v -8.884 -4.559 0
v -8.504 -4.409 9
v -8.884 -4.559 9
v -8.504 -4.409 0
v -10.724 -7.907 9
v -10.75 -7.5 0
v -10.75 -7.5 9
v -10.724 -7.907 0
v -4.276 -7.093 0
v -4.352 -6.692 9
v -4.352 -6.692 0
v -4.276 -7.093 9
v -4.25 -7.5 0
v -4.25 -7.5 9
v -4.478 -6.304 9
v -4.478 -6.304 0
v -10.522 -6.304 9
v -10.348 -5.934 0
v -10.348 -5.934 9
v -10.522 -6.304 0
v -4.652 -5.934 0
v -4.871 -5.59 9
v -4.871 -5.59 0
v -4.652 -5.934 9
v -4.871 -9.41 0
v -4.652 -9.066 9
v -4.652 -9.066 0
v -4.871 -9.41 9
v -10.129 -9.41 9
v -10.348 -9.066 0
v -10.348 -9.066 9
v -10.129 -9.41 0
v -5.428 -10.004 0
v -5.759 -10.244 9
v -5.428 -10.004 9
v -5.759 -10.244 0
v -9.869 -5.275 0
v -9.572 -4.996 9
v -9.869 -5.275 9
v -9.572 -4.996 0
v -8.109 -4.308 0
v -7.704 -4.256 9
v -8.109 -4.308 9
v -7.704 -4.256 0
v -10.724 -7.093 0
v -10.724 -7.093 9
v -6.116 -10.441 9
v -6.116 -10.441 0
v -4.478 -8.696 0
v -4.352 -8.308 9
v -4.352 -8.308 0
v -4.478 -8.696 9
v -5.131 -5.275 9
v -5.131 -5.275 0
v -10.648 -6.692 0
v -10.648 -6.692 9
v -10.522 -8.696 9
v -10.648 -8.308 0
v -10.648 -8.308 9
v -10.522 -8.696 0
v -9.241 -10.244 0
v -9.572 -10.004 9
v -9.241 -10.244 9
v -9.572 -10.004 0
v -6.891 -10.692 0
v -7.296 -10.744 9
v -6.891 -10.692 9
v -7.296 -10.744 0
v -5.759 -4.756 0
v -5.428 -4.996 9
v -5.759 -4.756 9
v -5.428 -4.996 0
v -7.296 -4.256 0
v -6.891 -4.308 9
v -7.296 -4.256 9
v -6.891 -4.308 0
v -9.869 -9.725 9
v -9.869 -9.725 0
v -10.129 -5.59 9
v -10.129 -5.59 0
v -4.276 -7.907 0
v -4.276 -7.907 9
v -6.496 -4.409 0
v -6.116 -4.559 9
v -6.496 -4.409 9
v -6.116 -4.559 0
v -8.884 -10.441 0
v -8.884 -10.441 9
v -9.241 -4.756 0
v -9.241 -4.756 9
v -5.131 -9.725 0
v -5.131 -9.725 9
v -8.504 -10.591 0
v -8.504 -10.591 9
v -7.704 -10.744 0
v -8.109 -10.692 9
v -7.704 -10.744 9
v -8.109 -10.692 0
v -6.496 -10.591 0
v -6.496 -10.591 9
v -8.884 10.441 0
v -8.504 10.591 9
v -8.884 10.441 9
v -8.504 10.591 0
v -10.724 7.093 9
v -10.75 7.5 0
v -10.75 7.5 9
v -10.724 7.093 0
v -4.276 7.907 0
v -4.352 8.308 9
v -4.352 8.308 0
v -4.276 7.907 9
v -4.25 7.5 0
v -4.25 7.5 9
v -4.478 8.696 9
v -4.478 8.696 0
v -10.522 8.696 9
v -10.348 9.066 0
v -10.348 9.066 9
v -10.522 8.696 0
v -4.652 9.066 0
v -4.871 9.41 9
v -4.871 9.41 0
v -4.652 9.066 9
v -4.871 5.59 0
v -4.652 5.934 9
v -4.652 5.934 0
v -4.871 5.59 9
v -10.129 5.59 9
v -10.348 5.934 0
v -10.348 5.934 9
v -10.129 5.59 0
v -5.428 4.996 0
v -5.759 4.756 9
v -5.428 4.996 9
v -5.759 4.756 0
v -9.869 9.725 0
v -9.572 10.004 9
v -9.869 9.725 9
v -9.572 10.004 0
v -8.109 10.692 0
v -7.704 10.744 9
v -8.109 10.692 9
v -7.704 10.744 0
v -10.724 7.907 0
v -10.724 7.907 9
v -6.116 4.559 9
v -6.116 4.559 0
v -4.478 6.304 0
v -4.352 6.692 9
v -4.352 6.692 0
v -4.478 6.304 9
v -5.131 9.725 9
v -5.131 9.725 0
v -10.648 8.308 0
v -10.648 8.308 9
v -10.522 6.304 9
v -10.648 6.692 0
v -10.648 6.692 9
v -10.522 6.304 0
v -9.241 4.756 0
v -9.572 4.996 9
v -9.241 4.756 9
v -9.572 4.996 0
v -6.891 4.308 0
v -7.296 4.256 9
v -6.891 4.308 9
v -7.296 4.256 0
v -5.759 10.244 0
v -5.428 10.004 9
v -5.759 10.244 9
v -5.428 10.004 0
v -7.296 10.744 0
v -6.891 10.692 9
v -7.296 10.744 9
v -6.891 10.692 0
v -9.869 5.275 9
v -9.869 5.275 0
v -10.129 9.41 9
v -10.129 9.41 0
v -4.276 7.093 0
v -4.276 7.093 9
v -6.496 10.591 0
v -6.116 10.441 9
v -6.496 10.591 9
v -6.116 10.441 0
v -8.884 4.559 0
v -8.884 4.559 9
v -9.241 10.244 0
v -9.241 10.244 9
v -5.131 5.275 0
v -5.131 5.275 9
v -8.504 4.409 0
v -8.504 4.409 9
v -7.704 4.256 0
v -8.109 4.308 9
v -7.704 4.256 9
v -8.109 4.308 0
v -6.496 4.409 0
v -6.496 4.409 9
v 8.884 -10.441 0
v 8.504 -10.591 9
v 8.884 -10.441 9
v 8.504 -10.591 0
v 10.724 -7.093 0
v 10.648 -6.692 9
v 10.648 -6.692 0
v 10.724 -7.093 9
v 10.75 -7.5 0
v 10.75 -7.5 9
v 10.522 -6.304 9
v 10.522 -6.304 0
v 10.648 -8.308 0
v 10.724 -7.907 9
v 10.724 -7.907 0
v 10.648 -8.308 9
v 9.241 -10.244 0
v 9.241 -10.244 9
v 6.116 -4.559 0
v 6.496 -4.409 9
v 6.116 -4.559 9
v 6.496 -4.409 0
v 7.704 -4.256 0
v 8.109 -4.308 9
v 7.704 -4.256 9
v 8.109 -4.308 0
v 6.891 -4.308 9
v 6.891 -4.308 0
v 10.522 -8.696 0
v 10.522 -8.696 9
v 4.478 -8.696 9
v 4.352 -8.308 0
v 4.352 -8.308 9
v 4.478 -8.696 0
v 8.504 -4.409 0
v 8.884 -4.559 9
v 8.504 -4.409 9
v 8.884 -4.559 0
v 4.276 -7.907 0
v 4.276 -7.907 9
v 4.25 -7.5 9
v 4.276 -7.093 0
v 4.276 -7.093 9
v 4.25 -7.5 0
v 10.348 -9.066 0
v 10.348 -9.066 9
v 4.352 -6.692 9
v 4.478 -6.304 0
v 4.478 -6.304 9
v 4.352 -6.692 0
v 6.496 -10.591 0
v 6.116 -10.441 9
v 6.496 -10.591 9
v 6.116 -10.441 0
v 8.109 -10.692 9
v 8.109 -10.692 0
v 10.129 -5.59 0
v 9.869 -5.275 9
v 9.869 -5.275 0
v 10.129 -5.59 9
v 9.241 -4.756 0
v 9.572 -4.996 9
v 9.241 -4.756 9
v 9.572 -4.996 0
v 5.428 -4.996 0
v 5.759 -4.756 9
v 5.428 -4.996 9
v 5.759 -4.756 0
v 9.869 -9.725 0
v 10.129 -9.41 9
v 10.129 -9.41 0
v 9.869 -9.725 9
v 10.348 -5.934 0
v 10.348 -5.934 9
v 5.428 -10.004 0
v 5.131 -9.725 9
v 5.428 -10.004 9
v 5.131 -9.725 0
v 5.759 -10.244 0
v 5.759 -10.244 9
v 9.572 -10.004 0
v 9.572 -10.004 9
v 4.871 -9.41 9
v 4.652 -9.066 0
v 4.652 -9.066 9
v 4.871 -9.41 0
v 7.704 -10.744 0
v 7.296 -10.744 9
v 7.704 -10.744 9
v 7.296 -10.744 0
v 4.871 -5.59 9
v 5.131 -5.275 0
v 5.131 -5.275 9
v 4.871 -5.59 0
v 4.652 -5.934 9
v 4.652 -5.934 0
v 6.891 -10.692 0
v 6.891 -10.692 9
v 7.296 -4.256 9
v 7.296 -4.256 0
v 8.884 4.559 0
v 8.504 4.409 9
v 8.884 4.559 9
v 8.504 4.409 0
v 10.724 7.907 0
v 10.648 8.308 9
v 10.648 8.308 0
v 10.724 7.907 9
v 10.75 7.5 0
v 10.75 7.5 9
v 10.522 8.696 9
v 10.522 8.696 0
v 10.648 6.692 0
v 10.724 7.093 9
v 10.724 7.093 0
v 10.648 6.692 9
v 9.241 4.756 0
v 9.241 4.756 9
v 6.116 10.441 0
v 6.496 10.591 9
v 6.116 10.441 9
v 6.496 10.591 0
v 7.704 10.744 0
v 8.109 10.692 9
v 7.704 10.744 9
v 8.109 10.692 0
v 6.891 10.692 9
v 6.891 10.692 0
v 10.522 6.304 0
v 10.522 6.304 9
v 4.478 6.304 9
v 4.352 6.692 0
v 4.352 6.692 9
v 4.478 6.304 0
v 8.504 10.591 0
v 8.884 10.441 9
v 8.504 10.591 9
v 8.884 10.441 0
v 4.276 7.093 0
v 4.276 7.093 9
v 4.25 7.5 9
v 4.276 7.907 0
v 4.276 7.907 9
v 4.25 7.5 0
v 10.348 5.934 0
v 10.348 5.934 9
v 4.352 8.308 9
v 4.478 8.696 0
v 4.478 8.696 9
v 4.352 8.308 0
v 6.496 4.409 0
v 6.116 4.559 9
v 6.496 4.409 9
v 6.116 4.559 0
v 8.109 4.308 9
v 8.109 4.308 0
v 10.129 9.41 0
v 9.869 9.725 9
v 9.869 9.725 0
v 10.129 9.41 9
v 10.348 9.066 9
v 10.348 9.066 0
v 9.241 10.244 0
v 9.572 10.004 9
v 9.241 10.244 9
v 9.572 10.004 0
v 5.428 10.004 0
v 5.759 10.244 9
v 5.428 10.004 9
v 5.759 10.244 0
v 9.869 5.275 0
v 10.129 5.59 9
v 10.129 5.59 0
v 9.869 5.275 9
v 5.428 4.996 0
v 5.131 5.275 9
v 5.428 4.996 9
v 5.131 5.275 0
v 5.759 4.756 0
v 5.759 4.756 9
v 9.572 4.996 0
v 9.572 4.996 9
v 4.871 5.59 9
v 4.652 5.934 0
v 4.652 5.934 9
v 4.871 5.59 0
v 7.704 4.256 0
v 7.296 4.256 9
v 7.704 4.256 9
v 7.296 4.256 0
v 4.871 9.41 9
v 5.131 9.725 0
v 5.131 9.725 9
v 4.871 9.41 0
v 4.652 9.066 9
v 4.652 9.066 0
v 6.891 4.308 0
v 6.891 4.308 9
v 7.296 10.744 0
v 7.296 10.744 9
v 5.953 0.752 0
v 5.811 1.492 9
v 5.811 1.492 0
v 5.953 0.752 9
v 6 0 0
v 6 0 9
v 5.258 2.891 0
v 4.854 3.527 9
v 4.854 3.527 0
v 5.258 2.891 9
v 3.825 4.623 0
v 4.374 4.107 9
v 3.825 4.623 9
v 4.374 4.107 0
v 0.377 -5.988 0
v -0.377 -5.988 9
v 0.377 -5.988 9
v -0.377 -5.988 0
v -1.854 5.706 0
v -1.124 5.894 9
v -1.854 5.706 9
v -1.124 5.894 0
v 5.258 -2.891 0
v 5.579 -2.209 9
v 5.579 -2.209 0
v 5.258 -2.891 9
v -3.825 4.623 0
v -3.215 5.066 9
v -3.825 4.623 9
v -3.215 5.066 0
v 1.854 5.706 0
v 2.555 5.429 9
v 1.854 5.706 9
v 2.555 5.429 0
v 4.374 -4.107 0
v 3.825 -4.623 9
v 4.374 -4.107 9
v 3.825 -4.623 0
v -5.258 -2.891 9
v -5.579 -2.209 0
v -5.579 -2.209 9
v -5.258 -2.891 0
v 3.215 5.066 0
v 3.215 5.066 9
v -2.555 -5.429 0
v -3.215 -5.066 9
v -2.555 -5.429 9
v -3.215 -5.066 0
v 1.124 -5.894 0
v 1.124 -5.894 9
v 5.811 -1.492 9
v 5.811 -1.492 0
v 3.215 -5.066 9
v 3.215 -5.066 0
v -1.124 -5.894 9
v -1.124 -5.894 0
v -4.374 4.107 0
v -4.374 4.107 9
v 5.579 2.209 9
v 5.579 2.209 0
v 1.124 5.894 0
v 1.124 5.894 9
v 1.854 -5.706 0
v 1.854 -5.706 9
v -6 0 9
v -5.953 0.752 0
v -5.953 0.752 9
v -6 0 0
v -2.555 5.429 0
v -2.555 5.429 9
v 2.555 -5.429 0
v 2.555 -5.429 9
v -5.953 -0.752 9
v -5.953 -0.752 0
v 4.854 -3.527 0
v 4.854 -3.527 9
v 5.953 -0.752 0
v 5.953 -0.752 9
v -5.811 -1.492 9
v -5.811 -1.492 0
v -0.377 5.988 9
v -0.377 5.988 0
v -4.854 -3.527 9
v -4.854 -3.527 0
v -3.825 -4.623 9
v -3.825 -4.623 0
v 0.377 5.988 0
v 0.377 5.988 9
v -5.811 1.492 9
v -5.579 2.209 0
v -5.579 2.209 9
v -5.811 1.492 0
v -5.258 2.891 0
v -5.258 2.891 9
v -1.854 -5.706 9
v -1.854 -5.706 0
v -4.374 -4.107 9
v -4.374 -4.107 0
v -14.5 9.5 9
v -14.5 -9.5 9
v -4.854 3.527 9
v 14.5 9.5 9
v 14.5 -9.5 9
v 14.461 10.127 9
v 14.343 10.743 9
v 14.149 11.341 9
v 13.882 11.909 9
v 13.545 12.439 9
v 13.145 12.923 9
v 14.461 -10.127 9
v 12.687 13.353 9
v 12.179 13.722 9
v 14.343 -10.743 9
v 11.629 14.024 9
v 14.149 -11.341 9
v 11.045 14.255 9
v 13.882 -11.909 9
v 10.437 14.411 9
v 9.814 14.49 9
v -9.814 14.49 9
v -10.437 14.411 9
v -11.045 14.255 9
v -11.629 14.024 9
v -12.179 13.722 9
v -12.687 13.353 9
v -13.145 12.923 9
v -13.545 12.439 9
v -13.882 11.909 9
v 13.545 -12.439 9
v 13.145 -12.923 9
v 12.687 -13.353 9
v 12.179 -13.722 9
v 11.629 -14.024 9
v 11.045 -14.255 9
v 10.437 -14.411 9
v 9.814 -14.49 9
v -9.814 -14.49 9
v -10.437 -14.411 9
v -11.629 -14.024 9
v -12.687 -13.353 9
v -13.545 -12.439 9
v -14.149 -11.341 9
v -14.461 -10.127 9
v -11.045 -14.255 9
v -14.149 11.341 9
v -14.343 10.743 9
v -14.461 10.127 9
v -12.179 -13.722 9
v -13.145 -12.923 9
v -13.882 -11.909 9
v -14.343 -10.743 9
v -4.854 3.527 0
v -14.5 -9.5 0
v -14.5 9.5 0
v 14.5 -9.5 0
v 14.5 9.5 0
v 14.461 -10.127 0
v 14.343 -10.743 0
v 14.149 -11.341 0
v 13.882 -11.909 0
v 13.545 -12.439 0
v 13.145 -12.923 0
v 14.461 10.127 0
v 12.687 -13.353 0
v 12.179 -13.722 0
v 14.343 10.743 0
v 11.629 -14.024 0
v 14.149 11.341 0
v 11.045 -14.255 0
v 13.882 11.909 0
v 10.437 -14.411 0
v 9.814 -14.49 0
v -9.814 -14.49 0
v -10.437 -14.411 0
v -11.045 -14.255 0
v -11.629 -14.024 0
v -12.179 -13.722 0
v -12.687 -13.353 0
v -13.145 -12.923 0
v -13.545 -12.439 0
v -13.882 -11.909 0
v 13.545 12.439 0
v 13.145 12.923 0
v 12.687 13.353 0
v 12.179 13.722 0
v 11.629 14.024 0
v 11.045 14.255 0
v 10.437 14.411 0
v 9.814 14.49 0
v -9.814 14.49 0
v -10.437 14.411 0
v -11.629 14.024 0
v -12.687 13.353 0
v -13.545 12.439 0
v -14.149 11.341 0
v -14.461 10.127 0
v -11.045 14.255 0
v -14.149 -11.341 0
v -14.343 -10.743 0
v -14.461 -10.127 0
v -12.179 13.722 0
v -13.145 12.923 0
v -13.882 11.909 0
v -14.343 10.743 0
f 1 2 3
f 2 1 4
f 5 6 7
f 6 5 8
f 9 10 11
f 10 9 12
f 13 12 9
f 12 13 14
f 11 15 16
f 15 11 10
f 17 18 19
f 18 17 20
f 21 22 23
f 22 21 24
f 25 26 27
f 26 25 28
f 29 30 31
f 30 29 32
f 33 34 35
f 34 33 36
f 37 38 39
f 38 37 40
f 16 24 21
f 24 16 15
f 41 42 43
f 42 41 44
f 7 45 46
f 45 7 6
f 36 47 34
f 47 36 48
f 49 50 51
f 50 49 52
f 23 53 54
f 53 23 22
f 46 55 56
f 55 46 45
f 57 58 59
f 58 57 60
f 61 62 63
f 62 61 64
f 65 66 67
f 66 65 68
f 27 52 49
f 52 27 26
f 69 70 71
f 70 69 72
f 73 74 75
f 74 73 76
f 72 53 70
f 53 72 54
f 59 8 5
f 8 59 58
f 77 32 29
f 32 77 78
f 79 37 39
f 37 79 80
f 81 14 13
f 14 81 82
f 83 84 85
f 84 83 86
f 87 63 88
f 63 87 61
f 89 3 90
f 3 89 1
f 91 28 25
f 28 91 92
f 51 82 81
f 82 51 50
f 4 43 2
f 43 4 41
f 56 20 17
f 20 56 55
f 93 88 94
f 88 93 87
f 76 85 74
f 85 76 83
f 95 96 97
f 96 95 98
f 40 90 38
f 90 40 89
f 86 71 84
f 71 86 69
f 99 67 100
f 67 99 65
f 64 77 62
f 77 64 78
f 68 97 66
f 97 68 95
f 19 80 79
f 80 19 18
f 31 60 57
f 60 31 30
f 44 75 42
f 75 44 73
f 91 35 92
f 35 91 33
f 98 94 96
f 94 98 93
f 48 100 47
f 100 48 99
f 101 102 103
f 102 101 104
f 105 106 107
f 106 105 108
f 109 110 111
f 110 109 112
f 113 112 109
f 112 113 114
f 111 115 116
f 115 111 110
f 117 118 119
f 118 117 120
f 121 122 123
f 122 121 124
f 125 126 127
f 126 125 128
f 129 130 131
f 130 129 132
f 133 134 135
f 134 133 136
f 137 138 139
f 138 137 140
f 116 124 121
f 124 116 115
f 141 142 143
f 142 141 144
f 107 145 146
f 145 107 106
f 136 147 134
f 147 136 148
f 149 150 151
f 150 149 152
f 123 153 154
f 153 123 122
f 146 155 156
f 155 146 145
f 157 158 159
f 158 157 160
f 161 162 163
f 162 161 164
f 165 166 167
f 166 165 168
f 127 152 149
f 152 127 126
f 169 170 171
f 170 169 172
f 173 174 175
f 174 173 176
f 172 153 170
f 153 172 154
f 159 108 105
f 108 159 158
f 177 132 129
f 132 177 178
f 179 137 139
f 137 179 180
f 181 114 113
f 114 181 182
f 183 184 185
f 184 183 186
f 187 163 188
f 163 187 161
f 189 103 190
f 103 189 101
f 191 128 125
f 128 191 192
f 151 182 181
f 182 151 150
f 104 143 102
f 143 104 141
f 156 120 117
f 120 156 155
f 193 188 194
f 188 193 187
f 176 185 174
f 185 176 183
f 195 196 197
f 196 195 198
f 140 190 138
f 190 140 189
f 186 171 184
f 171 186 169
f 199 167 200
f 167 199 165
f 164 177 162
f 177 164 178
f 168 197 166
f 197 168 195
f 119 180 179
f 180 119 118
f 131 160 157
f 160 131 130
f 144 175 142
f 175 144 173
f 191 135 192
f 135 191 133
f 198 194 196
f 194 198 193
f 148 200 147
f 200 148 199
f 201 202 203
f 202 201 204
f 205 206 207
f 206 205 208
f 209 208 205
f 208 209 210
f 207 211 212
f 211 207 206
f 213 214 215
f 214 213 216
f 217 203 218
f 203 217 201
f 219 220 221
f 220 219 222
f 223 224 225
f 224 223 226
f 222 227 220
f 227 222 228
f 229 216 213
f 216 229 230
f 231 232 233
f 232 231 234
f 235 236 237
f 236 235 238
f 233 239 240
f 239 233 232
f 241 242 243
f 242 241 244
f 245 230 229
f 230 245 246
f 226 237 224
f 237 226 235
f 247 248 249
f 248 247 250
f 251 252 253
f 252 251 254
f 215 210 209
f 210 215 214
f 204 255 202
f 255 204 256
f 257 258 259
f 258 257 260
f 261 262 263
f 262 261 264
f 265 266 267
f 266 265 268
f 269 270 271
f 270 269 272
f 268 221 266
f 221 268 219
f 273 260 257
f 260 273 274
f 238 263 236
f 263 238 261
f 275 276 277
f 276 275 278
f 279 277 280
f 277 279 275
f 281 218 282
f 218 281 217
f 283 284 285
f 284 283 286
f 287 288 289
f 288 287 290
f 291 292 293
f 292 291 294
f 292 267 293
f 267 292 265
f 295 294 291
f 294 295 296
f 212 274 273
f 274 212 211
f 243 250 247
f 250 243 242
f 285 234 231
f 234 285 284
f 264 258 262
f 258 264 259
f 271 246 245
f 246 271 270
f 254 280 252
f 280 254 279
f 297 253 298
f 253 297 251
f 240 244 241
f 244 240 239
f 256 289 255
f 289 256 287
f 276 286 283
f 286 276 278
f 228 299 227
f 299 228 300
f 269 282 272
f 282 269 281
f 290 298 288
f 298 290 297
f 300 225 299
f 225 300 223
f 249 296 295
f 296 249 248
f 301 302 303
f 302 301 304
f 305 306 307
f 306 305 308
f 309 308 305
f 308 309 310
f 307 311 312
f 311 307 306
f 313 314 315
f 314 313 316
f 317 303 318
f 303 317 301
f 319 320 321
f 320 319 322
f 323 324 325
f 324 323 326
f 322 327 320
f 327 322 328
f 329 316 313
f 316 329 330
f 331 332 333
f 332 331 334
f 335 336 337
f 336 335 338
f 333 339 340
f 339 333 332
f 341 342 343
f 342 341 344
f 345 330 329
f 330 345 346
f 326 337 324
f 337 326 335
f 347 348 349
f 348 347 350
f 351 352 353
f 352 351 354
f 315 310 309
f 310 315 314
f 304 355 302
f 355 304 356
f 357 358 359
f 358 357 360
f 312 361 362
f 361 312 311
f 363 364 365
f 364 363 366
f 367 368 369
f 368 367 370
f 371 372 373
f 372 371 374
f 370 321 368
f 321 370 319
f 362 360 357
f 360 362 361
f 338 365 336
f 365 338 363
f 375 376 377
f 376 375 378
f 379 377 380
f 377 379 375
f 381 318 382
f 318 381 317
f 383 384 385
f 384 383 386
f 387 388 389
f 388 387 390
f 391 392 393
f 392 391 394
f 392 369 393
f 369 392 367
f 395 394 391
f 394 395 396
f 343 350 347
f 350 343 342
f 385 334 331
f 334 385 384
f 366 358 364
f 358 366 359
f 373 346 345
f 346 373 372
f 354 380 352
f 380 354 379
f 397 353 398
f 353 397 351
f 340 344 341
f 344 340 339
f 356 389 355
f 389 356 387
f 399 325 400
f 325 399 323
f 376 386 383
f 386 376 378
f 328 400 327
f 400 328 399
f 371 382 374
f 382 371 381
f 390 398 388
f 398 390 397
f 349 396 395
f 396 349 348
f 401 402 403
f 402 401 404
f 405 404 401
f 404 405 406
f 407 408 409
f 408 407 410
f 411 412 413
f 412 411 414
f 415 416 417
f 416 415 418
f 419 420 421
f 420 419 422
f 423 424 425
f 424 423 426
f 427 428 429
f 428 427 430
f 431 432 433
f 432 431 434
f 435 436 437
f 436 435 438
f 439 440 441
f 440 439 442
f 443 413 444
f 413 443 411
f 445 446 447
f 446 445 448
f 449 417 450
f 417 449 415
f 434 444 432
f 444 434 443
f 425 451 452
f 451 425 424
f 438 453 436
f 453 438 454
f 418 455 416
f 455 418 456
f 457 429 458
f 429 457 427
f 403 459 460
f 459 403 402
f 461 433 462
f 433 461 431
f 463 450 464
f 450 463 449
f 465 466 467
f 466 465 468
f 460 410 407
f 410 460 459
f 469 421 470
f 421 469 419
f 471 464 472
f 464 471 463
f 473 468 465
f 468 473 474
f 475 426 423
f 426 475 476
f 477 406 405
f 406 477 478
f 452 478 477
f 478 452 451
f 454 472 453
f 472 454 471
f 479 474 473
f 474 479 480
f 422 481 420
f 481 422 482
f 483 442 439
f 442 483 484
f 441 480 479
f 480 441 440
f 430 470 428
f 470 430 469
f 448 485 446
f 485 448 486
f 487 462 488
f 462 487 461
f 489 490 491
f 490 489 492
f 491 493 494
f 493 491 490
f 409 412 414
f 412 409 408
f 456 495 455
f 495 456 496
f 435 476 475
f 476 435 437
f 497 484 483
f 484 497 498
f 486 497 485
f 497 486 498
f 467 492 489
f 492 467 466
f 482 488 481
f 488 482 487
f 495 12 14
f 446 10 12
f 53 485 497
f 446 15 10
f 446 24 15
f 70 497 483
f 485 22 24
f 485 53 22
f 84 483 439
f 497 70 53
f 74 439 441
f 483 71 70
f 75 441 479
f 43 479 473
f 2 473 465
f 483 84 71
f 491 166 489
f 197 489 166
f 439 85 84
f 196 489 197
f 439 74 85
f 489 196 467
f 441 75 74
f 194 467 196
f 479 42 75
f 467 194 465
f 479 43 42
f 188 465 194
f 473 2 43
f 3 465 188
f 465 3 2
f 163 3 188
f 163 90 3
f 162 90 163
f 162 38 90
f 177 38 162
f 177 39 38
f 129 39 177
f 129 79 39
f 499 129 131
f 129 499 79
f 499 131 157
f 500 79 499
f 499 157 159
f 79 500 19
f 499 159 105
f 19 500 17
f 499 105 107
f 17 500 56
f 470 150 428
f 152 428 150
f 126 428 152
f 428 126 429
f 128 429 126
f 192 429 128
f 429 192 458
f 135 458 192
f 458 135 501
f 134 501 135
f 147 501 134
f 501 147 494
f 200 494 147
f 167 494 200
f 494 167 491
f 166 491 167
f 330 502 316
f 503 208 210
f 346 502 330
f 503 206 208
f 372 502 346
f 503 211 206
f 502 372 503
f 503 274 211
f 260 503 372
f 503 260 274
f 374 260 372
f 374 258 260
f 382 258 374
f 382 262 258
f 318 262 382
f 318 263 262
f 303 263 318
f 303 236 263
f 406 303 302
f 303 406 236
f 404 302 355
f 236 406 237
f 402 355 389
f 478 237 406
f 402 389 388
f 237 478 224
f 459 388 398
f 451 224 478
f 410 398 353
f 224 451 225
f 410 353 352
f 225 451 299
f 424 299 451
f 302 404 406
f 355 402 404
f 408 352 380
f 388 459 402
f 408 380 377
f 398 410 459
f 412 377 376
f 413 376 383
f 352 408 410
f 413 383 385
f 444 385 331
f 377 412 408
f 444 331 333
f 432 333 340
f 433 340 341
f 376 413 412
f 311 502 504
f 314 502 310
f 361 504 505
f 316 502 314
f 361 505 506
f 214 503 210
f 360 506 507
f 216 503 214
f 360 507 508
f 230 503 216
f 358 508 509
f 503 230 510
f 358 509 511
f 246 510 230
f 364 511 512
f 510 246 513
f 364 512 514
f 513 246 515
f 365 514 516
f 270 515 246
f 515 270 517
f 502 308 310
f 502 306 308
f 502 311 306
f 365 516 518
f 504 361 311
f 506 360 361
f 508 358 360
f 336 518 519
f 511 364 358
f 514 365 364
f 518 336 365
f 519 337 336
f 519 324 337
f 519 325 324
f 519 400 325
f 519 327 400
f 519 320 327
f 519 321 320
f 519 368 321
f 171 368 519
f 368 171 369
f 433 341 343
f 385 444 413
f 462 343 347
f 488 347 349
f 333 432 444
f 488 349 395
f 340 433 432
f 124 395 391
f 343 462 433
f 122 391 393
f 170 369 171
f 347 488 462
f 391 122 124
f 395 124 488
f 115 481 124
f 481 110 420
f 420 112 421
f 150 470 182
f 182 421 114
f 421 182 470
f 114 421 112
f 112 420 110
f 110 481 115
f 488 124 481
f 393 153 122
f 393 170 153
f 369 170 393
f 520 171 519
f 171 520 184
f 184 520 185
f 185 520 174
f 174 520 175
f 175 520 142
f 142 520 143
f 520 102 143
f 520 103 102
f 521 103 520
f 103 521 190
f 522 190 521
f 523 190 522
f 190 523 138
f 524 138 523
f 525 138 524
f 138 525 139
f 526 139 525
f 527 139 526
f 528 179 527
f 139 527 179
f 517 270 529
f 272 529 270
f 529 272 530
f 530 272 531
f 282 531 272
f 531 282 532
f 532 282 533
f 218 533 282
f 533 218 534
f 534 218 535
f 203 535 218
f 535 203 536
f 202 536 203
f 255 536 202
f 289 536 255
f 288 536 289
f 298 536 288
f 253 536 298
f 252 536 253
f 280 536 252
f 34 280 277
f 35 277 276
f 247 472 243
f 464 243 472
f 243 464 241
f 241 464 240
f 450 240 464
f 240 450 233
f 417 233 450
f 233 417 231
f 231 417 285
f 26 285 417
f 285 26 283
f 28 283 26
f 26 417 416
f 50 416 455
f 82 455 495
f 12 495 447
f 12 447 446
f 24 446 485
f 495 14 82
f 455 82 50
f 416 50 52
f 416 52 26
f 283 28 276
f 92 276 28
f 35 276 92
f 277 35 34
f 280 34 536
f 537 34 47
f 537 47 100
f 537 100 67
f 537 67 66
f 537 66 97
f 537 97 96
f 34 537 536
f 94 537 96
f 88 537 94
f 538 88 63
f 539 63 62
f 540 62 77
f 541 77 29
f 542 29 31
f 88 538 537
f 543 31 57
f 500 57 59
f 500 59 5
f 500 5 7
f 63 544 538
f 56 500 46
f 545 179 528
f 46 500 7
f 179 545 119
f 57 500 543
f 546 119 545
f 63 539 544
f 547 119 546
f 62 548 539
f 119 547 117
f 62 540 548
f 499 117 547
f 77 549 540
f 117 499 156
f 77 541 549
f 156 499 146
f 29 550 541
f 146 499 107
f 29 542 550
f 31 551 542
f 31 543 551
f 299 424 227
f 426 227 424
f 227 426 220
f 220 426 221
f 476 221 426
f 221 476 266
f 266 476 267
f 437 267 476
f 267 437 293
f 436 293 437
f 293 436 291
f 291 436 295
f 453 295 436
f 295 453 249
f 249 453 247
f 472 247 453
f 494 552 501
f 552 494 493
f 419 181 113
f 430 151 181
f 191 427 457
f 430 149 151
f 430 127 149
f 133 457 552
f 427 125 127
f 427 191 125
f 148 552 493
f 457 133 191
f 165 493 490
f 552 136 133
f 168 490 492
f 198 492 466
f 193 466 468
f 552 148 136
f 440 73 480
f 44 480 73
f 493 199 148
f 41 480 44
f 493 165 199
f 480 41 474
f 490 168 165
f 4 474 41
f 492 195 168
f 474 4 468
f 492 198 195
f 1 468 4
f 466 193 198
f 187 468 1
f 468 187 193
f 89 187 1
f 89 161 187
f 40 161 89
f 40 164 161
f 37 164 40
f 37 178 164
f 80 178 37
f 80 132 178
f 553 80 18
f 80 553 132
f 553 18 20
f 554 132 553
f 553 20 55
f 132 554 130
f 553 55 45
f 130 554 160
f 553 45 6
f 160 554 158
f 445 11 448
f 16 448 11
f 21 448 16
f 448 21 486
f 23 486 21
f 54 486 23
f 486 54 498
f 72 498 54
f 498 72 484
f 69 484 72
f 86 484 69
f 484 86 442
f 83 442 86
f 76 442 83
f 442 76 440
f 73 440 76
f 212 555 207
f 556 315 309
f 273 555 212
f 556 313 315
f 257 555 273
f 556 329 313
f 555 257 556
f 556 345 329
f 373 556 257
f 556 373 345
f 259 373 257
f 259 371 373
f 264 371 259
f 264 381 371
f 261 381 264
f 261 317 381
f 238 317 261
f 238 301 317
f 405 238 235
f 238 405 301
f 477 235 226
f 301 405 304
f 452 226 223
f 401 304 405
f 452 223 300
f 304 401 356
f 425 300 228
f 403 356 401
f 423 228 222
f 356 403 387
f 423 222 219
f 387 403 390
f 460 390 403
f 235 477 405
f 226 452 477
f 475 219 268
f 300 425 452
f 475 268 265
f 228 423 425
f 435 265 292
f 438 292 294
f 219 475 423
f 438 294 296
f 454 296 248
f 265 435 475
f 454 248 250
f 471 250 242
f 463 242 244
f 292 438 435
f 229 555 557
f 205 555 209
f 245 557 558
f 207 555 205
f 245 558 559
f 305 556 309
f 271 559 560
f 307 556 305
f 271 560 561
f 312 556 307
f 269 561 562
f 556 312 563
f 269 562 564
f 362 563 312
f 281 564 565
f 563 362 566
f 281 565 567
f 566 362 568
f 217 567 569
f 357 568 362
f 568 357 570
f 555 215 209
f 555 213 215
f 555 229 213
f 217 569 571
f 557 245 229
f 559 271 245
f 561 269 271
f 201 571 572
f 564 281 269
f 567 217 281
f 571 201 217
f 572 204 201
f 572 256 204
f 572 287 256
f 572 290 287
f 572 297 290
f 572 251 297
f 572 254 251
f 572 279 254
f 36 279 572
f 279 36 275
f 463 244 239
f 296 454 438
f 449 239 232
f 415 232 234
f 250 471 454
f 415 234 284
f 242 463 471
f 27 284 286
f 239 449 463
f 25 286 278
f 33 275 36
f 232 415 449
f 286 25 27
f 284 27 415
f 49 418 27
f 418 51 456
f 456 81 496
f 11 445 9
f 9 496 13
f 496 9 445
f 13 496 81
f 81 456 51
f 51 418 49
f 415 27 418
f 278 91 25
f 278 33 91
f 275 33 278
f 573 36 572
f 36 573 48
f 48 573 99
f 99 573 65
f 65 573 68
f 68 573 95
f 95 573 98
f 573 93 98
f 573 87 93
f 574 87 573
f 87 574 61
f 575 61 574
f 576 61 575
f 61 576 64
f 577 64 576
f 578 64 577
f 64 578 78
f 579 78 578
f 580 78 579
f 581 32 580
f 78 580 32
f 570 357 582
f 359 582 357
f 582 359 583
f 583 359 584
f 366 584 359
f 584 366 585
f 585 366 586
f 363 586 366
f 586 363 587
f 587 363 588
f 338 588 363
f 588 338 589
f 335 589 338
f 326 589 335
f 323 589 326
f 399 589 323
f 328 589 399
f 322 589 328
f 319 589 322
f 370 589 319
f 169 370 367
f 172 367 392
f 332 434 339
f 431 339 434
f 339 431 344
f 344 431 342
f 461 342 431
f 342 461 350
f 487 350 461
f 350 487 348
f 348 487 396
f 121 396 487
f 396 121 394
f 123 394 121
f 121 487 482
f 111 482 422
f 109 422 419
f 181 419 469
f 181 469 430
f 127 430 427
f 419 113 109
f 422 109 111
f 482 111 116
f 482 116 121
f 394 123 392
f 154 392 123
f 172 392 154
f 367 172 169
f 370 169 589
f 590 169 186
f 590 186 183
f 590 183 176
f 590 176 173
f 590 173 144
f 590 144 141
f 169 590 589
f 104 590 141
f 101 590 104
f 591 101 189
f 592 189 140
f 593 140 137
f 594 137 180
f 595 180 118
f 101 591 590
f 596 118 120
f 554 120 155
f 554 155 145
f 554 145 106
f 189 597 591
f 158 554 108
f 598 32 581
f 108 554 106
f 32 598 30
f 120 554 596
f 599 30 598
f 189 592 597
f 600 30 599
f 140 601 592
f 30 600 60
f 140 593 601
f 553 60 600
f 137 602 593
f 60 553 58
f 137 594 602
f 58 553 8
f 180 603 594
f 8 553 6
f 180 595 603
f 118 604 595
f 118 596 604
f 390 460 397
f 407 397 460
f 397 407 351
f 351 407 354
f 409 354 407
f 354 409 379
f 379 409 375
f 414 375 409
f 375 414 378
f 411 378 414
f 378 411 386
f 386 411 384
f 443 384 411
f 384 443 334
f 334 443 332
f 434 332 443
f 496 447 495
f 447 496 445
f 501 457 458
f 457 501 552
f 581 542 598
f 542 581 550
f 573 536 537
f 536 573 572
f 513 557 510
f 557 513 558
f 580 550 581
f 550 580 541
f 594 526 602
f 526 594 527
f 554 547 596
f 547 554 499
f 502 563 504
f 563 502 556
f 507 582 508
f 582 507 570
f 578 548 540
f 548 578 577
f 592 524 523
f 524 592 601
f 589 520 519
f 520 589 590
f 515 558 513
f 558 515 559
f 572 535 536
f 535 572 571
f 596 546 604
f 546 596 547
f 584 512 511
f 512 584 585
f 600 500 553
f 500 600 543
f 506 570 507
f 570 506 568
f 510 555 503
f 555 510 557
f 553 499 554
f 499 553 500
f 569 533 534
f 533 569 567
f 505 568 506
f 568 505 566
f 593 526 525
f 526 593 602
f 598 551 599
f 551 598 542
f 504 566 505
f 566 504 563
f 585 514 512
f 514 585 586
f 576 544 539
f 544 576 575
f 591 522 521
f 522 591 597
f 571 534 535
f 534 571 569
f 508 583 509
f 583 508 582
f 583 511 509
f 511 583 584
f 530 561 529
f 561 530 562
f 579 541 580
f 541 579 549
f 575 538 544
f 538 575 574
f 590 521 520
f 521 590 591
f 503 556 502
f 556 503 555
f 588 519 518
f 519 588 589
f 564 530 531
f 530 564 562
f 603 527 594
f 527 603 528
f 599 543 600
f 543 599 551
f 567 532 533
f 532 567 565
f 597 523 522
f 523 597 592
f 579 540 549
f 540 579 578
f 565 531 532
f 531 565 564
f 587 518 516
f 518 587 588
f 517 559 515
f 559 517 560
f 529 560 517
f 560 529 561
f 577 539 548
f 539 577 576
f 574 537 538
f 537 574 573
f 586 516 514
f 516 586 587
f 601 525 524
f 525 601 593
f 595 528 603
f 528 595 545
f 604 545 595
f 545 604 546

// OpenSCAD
$fn = 50;

difference() {
	union() {
		hull() {
			translate(v = [-9.5, 9.5, 0]) {
				cylinder(h = 9, r = 5);
			}
			translate(v = [9.5, 9.5, 0]) {
				cylinder(h = 9, r = 5);
			}
			translate(v = [-9.5, -9.5, 0]) {
				cylinder(h = 9, r = 5);
			}
			translate(v = [9.5, -9.5, 0]) {
				cylinder(h = 9, r = 5);
			}
		}
	}
	union() {
		translate(v = [-7.5, -7.5, -100.0]) {
			cylinder(h = 200, r = 3.25);
		}
		translate(v = [-7.5, 7.5, -100.0]) {
			cylinder(h = 200, r = 3.25);
		}
		translate(v = [7.5, -7.5, -100.0]) {
			cylinder(h = 200, r = 3.25);
		}
		translate(v = [7.5, 7.5, -100.0]) {
			cylinder(h = 200, r = 3.25);
		}
		translate(v = [-7.5, -7.5, -100.0]) {
			cylinder(h = 200, r = 1.8);
		}
		translate(v = [-7.5, 7.5, -100.0]) {
			cylinder(h = 200, r = 1.8);
		}
		translate(v = [7.5, -7.5, -100.0]) {
			cylinder(h = 200, r = 1.8);
		}
		translate(v = [7.5, 7.5, -100.0]) {
			cylinder(h = 200, r = 1.8);
		}
		cylinder(h = 9, r = 6.0);
	}
}
